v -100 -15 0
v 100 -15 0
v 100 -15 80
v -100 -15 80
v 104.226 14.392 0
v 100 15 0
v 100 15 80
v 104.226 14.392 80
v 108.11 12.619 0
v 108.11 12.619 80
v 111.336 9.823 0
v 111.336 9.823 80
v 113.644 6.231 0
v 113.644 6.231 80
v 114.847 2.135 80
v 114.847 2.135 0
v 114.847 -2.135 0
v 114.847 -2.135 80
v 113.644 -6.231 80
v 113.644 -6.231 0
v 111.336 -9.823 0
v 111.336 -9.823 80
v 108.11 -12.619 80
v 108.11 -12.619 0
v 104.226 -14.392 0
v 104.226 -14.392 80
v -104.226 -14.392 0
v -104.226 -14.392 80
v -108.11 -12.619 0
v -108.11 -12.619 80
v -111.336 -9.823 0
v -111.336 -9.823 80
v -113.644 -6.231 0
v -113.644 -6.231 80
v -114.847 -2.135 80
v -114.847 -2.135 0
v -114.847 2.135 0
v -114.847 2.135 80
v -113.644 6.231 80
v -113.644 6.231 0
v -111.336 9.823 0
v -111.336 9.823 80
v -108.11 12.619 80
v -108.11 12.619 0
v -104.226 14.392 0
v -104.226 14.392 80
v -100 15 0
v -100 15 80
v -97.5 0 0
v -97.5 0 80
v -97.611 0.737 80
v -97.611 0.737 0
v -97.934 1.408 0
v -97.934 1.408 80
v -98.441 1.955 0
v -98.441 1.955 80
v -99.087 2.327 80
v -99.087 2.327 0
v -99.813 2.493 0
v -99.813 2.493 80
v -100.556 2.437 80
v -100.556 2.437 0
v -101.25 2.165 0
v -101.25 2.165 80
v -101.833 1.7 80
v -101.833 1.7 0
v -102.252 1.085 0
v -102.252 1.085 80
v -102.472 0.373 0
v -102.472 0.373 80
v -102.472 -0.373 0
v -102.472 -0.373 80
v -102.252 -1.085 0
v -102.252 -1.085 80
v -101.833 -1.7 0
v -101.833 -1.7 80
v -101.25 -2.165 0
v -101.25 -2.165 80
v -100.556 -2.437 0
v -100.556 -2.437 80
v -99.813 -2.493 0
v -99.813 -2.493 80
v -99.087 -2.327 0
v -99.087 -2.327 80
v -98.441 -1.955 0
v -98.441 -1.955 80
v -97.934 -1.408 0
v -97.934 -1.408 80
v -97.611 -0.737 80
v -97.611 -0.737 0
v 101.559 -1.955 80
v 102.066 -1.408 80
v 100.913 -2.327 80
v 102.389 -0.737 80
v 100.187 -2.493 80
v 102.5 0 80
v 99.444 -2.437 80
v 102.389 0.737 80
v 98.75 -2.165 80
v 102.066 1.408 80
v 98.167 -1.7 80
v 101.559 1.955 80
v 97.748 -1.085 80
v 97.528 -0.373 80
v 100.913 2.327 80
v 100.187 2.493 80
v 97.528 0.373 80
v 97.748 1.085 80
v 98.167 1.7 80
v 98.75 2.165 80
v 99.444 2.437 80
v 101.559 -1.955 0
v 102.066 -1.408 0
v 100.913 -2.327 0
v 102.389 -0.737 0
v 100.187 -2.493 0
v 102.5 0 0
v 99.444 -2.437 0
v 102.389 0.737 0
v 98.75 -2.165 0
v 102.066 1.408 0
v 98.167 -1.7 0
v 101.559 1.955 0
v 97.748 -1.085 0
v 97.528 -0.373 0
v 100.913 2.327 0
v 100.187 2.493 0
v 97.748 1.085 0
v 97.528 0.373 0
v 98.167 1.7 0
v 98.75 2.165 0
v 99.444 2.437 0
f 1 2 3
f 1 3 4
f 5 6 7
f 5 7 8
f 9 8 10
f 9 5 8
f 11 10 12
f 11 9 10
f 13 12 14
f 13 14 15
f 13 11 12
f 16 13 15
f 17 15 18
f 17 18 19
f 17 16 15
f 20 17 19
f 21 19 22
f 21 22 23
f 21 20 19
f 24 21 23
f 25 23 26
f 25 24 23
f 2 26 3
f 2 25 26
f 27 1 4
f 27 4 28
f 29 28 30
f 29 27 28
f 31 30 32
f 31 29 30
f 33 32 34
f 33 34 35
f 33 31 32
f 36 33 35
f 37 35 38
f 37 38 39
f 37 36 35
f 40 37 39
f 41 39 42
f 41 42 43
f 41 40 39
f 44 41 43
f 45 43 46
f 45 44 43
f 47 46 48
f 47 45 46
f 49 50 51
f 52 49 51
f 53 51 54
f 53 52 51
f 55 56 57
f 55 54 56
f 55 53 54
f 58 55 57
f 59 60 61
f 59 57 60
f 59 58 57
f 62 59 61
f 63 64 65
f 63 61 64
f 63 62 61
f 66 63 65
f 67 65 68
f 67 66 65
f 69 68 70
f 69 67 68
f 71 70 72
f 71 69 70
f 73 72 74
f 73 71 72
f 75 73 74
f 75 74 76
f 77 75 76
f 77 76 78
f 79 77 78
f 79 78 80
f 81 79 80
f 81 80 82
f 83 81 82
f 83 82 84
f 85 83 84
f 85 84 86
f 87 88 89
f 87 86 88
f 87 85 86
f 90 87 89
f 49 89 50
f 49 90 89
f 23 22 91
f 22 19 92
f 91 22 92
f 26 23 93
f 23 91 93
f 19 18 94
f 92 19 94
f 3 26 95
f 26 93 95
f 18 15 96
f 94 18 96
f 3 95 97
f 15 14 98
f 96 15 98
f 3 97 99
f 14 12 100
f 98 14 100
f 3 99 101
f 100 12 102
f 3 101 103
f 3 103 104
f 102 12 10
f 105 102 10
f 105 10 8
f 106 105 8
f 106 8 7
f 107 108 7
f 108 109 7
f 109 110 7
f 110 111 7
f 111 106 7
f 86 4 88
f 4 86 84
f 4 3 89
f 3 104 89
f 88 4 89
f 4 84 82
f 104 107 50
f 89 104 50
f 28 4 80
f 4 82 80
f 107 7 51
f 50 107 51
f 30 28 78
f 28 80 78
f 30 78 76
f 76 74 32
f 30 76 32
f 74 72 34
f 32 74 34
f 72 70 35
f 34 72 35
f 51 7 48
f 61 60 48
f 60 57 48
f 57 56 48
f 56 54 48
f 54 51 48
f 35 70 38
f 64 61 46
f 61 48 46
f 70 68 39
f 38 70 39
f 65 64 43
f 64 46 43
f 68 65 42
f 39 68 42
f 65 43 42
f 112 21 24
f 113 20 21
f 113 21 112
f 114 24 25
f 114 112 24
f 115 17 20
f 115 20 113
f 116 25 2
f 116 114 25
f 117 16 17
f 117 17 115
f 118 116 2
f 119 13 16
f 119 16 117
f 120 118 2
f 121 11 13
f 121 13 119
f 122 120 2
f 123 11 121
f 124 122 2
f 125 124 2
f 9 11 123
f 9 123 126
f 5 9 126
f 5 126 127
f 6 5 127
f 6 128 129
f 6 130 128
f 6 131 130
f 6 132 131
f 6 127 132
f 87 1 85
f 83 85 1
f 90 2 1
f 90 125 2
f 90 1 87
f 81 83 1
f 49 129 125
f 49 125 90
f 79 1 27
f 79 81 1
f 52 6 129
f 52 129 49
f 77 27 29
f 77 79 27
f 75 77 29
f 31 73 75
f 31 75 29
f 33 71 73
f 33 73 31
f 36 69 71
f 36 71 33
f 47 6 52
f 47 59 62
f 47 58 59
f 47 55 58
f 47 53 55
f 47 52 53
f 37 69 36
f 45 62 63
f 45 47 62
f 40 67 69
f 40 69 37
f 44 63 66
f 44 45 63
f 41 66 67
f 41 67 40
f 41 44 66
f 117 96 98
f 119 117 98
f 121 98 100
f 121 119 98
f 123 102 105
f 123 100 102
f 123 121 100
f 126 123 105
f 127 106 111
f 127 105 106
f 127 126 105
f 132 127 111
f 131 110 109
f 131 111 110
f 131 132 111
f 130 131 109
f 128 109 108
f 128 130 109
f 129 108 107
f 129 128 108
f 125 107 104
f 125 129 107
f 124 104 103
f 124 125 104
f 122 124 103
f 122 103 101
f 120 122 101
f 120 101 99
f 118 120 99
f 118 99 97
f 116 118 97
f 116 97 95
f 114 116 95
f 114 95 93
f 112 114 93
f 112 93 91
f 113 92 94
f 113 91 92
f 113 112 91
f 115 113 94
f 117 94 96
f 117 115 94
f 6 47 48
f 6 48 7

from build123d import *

# Parameters (mm, degrees)
EXTRUDE_1_DEPTH          = 80
CUT_EXTRUDE_1_DEPTH      = 141.890028036
CUT_EXTRUDE_1_DEPTH_BACK = 141.890028036
SKETCH_2_R               = 2.5


with BuildPart() as part:
    # 草图1 → 凸台-拉伸1 (new body)
    with BuildSketch(Plane.XY):
        with BuildLine():
            Line((-100, 15), (100, 15))
            ThreePointArc((100, 15), (115, 0), (100, -15))
            Line((100, -15), (-100, -15))
            ThreePointArc((-100, -15), (-115, 0), (-100, 15))
        make_face()
    extrude(amount=EXTRUDE_1_DEPTH)

    # 草图2 → 切除-拉伸1 (cut, two sides: drawn at the far end of the back side and taken through both)
    with BuildSketch(Plane.XY.offset(80).offset(-CUT_EXTRUDE_1_DEPTH_BACK)):
        with Locations((-100, 0)):
            Circle(SKETCH_2_R)
        with Locations((100, 0)):
            Circle(SKETCH_2_R)
    extrude(amount=CUT_EXTRUDE_1_DEPTH + CUT_EXTRUDE_1_DEPTH_BACK, mode=Mode.SUBTRACT)


solid = part.part
